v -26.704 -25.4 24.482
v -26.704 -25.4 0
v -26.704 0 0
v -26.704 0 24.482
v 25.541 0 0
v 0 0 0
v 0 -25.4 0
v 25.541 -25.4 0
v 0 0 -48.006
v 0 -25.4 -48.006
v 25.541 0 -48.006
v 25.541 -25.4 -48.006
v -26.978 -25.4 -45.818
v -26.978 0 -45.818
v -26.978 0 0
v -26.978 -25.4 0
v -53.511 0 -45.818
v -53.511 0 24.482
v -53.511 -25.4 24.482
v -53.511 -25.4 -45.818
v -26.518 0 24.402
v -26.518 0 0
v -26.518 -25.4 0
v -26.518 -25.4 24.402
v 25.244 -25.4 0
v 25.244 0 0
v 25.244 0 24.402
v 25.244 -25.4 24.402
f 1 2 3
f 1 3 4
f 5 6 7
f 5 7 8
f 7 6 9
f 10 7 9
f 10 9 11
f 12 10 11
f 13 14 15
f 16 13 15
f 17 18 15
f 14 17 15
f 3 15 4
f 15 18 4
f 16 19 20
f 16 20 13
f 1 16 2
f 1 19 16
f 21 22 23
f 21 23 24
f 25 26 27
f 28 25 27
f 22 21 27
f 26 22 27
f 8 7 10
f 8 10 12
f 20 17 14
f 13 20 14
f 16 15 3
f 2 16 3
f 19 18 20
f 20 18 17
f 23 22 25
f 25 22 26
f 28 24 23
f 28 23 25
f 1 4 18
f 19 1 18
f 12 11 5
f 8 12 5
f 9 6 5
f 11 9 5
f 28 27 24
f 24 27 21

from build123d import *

# Parameters (mm, degrees)
F1_W     = 26.5332311392
F1_H     = 20.9256932139
F1_H_2   = 24.8920023441
F2_DEPTH = 25.4
F1_W_2   = 25.5414955318
F1_H_3   = 27.080308646
F0_W     = 26.5182834119
F0_H     = 24.4023110718
F0_W_2   = 25.2441931516


with BuildPart() as f2:
    # F1 (on Front) → F2 (new body)
    with BuildSketch(Plane.XZ):
        Polygon((-26.7043504864, 0), (-26.7043504864, 24.4816932827), (-53.511120379, 24.4816932827), (-53.511120379, 0), (-26.9778892398, 0), align=None)
        with Locations((-40.2445048094, -10.462846607)):
            Rectangle(F1_W, F1_H)
        with Locations((-40.2445048094, -33.371694386)):
            Rectangle(F1_W, F1_H_2)
    extrude(amount=F2_DEPTH)


with BuildPart() as f2b:
    # F1 (on Front) → F2, piece 2 (new body)
    with BuildSketch(Plane.XZ):
        with Locations((12.7707477659, -10.462846607)):
            Rectangle(F1_W_2, F1_H)
        with Locations((12.7707477659, -34.4658475369)):
            Rectangle(F1_W_2, F1_H_3)
    extrude(amount=F2_DEPTH)


with BuildPart() as f2c:
    # F0 (on Front) → F2, piece 3 (new body)
    with BuildSketch(Plane.XZ):
        with Locations((-13.2591417059, 12.2011555359)):
            Rectangle(F0_W, F0_H)
        with Locations((12.6220965758, 12.2011555359)):
            Rectangle(F0_W_2, F0_H)
    extrude(amount=F2_DEPTH)


solid = Compound([f2.part, f2b.part, f2c.part])
